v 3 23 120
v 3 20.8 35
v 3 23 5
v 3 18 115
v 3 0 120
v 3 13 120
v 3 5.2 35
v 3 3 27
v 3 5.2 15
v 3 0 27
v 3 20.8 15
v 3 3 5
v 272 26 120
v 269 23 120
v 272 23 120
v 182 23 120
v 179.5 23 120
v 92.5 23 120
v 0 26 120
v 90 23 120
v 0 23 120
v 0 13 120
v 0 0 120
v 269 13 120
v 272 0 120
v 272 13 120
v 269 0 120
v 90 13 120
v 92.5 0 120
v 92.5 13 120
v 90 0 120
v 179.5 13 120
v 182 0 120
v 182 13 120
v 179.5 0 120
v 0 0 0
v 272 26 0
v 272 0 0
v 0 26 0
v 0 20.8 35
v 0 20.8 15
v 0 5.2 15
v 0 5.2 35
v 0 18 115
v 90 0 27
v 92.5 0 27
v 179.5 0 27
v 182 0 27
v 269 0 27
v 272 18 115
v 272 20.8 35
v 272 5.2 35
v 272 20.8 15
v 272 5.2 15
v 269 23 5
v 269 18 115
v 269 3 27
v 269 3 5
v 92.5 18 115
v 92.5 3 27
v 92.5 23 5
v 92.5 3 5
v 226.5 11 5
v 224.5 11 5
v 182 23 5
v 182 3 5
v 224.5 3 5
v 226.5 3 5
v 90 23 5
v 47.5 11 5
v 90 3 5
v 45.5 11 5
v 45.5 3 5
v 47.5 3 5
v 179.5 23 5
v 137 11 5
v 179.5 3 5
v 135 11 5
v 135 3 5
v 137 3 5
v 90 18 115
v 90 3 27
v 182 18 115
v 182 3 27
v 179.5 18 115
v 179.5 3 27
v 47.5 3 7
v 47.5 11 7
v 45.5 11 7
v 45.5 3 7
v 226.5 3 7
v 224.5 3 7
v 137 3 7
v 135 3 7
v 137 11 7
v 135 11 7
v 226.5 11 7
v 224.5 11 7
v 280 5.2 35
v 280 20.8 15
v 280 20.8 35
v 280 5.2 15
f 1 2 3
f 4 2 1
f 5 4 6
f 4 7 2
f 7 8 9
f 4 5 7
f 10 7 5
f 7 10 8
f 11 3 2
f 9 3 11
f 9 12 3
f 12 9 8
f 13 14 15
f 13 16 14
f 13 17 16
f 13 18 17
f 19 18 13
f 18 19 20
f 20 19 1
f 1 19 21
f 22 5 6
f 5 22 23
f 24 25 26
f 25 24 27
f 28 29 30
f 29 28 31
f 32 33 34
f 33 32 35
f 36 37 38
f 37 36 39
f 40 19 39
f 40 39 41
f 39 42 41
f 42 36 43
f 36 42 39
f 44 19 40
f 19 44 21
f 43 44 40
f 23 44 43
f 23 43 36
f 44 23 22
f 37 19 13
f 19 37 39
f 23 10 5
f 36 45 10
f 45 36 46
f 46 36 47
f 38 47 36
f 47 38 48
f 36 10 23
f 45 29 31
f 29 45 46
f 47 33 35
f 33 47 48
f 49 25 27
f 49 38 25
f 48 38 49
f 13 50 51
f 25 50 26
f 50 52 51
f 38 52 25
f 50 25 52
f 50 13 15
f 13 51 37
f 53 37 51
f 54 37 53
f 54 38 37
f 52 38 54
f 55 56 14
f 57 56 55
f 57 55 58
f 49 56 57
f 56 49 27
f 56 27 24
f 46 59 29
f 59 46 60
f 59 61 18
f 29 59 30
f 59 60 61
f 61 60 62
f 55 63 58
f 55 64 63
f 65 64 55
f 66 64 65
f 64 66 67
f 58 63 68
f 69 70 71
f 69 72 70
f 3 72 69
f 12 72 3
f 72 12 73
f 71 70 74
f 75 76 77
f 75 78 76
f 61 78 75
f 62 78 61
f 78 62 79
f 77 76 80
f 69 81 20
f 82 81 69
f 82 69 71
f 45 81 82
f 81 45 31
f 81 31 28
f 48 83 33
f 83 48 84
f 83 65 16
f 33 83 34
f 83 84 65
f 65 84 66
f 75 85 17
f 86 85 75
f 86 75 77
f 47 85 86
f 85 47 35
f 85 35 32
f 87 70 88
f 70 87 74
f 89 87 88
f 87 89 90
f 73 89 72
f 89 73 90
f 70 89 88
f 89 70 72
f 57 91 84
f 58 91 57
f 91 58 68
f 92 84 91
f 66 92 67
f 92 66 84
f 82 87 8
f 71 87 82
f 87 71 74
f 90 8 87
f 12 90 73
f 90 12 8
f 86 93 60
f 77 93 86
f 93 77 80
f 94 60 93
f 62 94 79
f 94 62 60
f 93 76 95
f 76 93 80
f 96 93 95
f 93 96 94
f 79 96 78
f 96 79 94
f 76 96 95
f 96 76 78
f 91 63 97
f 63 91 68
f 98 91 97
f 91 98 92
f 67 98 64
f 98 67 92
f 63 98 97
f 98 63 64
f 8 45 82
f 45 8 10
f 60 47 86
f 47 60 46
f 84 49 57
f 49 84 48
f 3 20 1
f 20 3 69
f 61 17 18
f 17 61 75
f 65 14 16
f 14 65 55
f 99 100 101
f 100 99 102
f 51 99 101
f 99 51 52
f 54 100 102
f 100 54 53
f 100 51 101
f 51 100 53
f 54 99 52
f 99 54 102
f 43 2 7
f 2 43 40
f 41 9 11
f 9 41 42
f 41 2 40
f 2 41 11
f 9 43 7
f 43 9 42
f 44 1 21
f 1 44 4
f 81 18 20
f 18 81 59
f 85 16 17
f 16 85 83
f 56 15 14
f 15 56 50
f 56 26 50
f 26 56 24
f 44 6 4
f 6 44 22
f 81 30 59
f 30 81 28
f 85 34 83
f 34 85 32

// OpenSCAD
// PrimeBind Pack Opening System — Part 1: Pack Display Rack
//
// Holds 3 sealed booster packs upright for display — packs lean against
// the back wall, art visible from the front. PrimeBind logo embossed on
// the front lip.
//
// MODULAR: Side connector tabs allow two units to snap together side by side
// for 6-pack capacity without glue.
//
// PRINT: Single color. Fits K2 Plus in one job (~268mm × 30mm × 122mm).
// Recommended: Black or Obsidian. Print upright (as designed — no rotation).
//
// PART OF: PrimeBind Pack Opening System
//   Part 1 → This file (rack)
//   Part 2 → pb_pack_system_p2_hopper.scad
//   Part 3 → pb_pack_system_p3_sorter.scad

// ── PACK DIMENSIONS ──────────────────────────────────────────────────────────
pack_w   = 85;    // Pokemon booster pack width (mm)
pack_h   = 130;   // pack height standing upright
pack_t   = 6;     // pack thickness sealed
pack_tol = 1.0;   // clearance on each side of pack (slide-in tolerance)

// ── RACK CONFIG ───────────────────────────────────────────────────────────────
n_packs  = 3;     // slots per unit (print 2 units for 6 packs)
div_t    = 2.5;   // divider thickness
wall_t   = 3.0;   // outer wall thickness
base_t   = 5.0;   // base plate thickness
lip_h    = 22.0;  // front lip height — holds pack bottom in, art visible above
back_h   = 115.0; // back wall height — packs lean here, top few mm visible above

// ── DEPTH DESIGN ─────────────────────────────────────────────────────────────
// Front wall → pack slot → air gap → back wall
front_wall_d = wall_t;
slot_d       = pack_t + 2 * pack_tol;   // 8mm
air_gap_d    = 12.0;   // space behind slot — adds rigidity, not wasted
back_wall_d  = wall_t;
total_d      = front_wall_d + slot_d + air_gap_d + back_wall_d;   // ~26mm

// ── WIDTH ─────────────────────────────────────────────────────────────────────
slot_w   = pack_w + 2 * pack_tol;        // 87mm per slot
total_w  = wall_t + n_packs * slot_w + (n_packs - 1) * div_t + wall_t;
// 3 slots: 3 + 3×87 + 2×2.5 + 3 = 272mm ✓ fits K2 Plus 350mm bed

// ── CONNECTOR TABS (modular side join) ────────────────────────────────────────
// Male tab on right side, female slot on left side.
// Two units click together: right tab of unit A slides into left slot of unit B.
tab_w    = 8.0;
tab_h    = 20.0;
tab_d    = total_d * 0.6;    // tab spans 60% of depth
tab_z    = base_t + 10.0;    // height off base where tab sits

$fn = 32;

// ── HELPERS ──────────────────────────────────────────────────────────────────

// Rounded base fillet for front lip to base transition
module fillet_strip(len, r) {
    translate([0, 0, 0])
    rotate([0, 90, 0])
    cylinder(r=r, h=len, $fn=16);
}

// ── BASE PLATE ────────────────────────────────────────────────────────────────
module base_plate() {
    cube([total_w, total_d, base_t]);
}

// ── FRONT LIP ─────────────────────────────────────────────────────────────────
// Low front wall that cradles the bottom of each pack.
// Pack art is fully visible above the lip.
module front_lip() {
    translate([0, 0, base_t])
        cube([total_w, front_wall_d, lip_h]);
}

// ── BACK WALL ─────────────────────────────────────────────────────────────────
// Full-height rear wall. Packs lean against this.
// Chamfered top edge so packs slide in smoothly.
module back_wall() {
    translate([0, total_d - back_wall_d, base_t])
        cube([total_w, back_wall_d, back_h]);
}

// ── OUTER SIDE WALLS ──────────────────────────────────────────────────────────
module side_walls() {
    // Left wall
    cube([wall_t, total_d, base_t + back_h]);
    // Right wall
    translate([total_w - wall_t, 0, 0])
        cube([wall_t, total_d, base_t + back_h]);
}

// ── SLOT DIVIDERS ─────────────────────────────────────────────────────────────
// Vertical walls between pack slots — extend full height of back wall.
module dividers() {
    for (i = [1 : n_packs - 1]) {
        x = wall_t + i * slot_w + (i - 1) * div_t;
        translate([x, 0, base_t])
            cube([div_t, total_d, back_h]);
    }
}

// ── FLOOR SUPPORT RIBS ────────────────────────────────────────────────────────
// Triangular ribs on base floor of each slot — cradle pack bottom, add rigidity.
// Each rib is a thin triangle bridging front wall to back wall at base level.
module slot_floor_ribs() {
    for (i = [0 : n_packs - 1]) {
        cx = wall_t + i * (slot_w + div_t) + slot_w / 2;
        // small center rib under each slot
        translate([cx - 1, front_wall_d, base_t])
            cube([2, slot_d, 2]);
    }
}

// ── CONNECTOR — MALE TAB (right side) ────────────────────────────────────────
module connector_tab_male() {
    translate([total_w, (total_d - tab_d) / 2, tab_z])
        cube([tab_w, tab_d, tab_h]);
}

// ── CONNECTOR — FEMALE SLOT (left side, negative) ────────────────────────────
module connector_slot_female() {
    // Cut into left wall to receive male tab from adjacent unit
    // Add 0.3mm clearance for fit
    translate([-0.1, (total_d - tab_d) / 2, tab_z])
        cube([tab_w + 0.3, tab_d, tab_h]);
}

// ── PRIMEBIND LOGO (embossed on front lip face) ───────────────────────────────
module logo_emboss() {
    translate([total_w / 2, -0.1, base_t + lip_h / 2])
        rotate([90, 0, 0])
            linear_extrude(height = 1.0)
                text("PRIMEBIND", size = 9,
                     font = "Bunken Tech Sans Pro ExBd:style=ExtraBold Italic",
                     halign = "center", valign = "center");
}

// ── PACK COUNT LABEL PER SLOT (small number, back wall) ──────────────────────
module slot_labels() {
    for (i = [0 : n_packs - 1]) {
        cx = wall_t + i * (slot_w + div_t) + slot_w / 2;
        translate([cx, total_d - back_wall_d - 0.1, base_t + lip_h + 8])
            rotate([90, 0, 0])
                linear_extrude(height = 0.8)
                    text(str(i + 1), size = 10,
                         font = "Liberation Sans:style=Bold",
                         halign = "center", valign = "center");
    }
}

// ── TOP CHAMFER ON BACK WALL (guide for sliding packs in) ────────────────────
module back_wall_chamfer() {
    chamfer_size = 5;
    translate([0, total_d - back_wall_d - chamfer_size, base_t + back_h - chamfer_size])
        rotate([45, 0, 0])
            cube([total_w, chamfer_size * 1.5, chamfer_size * 1.5]);
}

// ── ASSEMBLY ──────────────────────────────────────────────────────────────────
difference() {
    union() {
        base_plate();
        front_lip();
        back_wall();
        side_walls();
        dividers();
        slot_floor_ribs();
        connector_tab_male();   // male tab on right side
    }
    connector_slot_female();    // female slot cut from left side
    logo_emboss();
    back_wall_chamfer();
}
